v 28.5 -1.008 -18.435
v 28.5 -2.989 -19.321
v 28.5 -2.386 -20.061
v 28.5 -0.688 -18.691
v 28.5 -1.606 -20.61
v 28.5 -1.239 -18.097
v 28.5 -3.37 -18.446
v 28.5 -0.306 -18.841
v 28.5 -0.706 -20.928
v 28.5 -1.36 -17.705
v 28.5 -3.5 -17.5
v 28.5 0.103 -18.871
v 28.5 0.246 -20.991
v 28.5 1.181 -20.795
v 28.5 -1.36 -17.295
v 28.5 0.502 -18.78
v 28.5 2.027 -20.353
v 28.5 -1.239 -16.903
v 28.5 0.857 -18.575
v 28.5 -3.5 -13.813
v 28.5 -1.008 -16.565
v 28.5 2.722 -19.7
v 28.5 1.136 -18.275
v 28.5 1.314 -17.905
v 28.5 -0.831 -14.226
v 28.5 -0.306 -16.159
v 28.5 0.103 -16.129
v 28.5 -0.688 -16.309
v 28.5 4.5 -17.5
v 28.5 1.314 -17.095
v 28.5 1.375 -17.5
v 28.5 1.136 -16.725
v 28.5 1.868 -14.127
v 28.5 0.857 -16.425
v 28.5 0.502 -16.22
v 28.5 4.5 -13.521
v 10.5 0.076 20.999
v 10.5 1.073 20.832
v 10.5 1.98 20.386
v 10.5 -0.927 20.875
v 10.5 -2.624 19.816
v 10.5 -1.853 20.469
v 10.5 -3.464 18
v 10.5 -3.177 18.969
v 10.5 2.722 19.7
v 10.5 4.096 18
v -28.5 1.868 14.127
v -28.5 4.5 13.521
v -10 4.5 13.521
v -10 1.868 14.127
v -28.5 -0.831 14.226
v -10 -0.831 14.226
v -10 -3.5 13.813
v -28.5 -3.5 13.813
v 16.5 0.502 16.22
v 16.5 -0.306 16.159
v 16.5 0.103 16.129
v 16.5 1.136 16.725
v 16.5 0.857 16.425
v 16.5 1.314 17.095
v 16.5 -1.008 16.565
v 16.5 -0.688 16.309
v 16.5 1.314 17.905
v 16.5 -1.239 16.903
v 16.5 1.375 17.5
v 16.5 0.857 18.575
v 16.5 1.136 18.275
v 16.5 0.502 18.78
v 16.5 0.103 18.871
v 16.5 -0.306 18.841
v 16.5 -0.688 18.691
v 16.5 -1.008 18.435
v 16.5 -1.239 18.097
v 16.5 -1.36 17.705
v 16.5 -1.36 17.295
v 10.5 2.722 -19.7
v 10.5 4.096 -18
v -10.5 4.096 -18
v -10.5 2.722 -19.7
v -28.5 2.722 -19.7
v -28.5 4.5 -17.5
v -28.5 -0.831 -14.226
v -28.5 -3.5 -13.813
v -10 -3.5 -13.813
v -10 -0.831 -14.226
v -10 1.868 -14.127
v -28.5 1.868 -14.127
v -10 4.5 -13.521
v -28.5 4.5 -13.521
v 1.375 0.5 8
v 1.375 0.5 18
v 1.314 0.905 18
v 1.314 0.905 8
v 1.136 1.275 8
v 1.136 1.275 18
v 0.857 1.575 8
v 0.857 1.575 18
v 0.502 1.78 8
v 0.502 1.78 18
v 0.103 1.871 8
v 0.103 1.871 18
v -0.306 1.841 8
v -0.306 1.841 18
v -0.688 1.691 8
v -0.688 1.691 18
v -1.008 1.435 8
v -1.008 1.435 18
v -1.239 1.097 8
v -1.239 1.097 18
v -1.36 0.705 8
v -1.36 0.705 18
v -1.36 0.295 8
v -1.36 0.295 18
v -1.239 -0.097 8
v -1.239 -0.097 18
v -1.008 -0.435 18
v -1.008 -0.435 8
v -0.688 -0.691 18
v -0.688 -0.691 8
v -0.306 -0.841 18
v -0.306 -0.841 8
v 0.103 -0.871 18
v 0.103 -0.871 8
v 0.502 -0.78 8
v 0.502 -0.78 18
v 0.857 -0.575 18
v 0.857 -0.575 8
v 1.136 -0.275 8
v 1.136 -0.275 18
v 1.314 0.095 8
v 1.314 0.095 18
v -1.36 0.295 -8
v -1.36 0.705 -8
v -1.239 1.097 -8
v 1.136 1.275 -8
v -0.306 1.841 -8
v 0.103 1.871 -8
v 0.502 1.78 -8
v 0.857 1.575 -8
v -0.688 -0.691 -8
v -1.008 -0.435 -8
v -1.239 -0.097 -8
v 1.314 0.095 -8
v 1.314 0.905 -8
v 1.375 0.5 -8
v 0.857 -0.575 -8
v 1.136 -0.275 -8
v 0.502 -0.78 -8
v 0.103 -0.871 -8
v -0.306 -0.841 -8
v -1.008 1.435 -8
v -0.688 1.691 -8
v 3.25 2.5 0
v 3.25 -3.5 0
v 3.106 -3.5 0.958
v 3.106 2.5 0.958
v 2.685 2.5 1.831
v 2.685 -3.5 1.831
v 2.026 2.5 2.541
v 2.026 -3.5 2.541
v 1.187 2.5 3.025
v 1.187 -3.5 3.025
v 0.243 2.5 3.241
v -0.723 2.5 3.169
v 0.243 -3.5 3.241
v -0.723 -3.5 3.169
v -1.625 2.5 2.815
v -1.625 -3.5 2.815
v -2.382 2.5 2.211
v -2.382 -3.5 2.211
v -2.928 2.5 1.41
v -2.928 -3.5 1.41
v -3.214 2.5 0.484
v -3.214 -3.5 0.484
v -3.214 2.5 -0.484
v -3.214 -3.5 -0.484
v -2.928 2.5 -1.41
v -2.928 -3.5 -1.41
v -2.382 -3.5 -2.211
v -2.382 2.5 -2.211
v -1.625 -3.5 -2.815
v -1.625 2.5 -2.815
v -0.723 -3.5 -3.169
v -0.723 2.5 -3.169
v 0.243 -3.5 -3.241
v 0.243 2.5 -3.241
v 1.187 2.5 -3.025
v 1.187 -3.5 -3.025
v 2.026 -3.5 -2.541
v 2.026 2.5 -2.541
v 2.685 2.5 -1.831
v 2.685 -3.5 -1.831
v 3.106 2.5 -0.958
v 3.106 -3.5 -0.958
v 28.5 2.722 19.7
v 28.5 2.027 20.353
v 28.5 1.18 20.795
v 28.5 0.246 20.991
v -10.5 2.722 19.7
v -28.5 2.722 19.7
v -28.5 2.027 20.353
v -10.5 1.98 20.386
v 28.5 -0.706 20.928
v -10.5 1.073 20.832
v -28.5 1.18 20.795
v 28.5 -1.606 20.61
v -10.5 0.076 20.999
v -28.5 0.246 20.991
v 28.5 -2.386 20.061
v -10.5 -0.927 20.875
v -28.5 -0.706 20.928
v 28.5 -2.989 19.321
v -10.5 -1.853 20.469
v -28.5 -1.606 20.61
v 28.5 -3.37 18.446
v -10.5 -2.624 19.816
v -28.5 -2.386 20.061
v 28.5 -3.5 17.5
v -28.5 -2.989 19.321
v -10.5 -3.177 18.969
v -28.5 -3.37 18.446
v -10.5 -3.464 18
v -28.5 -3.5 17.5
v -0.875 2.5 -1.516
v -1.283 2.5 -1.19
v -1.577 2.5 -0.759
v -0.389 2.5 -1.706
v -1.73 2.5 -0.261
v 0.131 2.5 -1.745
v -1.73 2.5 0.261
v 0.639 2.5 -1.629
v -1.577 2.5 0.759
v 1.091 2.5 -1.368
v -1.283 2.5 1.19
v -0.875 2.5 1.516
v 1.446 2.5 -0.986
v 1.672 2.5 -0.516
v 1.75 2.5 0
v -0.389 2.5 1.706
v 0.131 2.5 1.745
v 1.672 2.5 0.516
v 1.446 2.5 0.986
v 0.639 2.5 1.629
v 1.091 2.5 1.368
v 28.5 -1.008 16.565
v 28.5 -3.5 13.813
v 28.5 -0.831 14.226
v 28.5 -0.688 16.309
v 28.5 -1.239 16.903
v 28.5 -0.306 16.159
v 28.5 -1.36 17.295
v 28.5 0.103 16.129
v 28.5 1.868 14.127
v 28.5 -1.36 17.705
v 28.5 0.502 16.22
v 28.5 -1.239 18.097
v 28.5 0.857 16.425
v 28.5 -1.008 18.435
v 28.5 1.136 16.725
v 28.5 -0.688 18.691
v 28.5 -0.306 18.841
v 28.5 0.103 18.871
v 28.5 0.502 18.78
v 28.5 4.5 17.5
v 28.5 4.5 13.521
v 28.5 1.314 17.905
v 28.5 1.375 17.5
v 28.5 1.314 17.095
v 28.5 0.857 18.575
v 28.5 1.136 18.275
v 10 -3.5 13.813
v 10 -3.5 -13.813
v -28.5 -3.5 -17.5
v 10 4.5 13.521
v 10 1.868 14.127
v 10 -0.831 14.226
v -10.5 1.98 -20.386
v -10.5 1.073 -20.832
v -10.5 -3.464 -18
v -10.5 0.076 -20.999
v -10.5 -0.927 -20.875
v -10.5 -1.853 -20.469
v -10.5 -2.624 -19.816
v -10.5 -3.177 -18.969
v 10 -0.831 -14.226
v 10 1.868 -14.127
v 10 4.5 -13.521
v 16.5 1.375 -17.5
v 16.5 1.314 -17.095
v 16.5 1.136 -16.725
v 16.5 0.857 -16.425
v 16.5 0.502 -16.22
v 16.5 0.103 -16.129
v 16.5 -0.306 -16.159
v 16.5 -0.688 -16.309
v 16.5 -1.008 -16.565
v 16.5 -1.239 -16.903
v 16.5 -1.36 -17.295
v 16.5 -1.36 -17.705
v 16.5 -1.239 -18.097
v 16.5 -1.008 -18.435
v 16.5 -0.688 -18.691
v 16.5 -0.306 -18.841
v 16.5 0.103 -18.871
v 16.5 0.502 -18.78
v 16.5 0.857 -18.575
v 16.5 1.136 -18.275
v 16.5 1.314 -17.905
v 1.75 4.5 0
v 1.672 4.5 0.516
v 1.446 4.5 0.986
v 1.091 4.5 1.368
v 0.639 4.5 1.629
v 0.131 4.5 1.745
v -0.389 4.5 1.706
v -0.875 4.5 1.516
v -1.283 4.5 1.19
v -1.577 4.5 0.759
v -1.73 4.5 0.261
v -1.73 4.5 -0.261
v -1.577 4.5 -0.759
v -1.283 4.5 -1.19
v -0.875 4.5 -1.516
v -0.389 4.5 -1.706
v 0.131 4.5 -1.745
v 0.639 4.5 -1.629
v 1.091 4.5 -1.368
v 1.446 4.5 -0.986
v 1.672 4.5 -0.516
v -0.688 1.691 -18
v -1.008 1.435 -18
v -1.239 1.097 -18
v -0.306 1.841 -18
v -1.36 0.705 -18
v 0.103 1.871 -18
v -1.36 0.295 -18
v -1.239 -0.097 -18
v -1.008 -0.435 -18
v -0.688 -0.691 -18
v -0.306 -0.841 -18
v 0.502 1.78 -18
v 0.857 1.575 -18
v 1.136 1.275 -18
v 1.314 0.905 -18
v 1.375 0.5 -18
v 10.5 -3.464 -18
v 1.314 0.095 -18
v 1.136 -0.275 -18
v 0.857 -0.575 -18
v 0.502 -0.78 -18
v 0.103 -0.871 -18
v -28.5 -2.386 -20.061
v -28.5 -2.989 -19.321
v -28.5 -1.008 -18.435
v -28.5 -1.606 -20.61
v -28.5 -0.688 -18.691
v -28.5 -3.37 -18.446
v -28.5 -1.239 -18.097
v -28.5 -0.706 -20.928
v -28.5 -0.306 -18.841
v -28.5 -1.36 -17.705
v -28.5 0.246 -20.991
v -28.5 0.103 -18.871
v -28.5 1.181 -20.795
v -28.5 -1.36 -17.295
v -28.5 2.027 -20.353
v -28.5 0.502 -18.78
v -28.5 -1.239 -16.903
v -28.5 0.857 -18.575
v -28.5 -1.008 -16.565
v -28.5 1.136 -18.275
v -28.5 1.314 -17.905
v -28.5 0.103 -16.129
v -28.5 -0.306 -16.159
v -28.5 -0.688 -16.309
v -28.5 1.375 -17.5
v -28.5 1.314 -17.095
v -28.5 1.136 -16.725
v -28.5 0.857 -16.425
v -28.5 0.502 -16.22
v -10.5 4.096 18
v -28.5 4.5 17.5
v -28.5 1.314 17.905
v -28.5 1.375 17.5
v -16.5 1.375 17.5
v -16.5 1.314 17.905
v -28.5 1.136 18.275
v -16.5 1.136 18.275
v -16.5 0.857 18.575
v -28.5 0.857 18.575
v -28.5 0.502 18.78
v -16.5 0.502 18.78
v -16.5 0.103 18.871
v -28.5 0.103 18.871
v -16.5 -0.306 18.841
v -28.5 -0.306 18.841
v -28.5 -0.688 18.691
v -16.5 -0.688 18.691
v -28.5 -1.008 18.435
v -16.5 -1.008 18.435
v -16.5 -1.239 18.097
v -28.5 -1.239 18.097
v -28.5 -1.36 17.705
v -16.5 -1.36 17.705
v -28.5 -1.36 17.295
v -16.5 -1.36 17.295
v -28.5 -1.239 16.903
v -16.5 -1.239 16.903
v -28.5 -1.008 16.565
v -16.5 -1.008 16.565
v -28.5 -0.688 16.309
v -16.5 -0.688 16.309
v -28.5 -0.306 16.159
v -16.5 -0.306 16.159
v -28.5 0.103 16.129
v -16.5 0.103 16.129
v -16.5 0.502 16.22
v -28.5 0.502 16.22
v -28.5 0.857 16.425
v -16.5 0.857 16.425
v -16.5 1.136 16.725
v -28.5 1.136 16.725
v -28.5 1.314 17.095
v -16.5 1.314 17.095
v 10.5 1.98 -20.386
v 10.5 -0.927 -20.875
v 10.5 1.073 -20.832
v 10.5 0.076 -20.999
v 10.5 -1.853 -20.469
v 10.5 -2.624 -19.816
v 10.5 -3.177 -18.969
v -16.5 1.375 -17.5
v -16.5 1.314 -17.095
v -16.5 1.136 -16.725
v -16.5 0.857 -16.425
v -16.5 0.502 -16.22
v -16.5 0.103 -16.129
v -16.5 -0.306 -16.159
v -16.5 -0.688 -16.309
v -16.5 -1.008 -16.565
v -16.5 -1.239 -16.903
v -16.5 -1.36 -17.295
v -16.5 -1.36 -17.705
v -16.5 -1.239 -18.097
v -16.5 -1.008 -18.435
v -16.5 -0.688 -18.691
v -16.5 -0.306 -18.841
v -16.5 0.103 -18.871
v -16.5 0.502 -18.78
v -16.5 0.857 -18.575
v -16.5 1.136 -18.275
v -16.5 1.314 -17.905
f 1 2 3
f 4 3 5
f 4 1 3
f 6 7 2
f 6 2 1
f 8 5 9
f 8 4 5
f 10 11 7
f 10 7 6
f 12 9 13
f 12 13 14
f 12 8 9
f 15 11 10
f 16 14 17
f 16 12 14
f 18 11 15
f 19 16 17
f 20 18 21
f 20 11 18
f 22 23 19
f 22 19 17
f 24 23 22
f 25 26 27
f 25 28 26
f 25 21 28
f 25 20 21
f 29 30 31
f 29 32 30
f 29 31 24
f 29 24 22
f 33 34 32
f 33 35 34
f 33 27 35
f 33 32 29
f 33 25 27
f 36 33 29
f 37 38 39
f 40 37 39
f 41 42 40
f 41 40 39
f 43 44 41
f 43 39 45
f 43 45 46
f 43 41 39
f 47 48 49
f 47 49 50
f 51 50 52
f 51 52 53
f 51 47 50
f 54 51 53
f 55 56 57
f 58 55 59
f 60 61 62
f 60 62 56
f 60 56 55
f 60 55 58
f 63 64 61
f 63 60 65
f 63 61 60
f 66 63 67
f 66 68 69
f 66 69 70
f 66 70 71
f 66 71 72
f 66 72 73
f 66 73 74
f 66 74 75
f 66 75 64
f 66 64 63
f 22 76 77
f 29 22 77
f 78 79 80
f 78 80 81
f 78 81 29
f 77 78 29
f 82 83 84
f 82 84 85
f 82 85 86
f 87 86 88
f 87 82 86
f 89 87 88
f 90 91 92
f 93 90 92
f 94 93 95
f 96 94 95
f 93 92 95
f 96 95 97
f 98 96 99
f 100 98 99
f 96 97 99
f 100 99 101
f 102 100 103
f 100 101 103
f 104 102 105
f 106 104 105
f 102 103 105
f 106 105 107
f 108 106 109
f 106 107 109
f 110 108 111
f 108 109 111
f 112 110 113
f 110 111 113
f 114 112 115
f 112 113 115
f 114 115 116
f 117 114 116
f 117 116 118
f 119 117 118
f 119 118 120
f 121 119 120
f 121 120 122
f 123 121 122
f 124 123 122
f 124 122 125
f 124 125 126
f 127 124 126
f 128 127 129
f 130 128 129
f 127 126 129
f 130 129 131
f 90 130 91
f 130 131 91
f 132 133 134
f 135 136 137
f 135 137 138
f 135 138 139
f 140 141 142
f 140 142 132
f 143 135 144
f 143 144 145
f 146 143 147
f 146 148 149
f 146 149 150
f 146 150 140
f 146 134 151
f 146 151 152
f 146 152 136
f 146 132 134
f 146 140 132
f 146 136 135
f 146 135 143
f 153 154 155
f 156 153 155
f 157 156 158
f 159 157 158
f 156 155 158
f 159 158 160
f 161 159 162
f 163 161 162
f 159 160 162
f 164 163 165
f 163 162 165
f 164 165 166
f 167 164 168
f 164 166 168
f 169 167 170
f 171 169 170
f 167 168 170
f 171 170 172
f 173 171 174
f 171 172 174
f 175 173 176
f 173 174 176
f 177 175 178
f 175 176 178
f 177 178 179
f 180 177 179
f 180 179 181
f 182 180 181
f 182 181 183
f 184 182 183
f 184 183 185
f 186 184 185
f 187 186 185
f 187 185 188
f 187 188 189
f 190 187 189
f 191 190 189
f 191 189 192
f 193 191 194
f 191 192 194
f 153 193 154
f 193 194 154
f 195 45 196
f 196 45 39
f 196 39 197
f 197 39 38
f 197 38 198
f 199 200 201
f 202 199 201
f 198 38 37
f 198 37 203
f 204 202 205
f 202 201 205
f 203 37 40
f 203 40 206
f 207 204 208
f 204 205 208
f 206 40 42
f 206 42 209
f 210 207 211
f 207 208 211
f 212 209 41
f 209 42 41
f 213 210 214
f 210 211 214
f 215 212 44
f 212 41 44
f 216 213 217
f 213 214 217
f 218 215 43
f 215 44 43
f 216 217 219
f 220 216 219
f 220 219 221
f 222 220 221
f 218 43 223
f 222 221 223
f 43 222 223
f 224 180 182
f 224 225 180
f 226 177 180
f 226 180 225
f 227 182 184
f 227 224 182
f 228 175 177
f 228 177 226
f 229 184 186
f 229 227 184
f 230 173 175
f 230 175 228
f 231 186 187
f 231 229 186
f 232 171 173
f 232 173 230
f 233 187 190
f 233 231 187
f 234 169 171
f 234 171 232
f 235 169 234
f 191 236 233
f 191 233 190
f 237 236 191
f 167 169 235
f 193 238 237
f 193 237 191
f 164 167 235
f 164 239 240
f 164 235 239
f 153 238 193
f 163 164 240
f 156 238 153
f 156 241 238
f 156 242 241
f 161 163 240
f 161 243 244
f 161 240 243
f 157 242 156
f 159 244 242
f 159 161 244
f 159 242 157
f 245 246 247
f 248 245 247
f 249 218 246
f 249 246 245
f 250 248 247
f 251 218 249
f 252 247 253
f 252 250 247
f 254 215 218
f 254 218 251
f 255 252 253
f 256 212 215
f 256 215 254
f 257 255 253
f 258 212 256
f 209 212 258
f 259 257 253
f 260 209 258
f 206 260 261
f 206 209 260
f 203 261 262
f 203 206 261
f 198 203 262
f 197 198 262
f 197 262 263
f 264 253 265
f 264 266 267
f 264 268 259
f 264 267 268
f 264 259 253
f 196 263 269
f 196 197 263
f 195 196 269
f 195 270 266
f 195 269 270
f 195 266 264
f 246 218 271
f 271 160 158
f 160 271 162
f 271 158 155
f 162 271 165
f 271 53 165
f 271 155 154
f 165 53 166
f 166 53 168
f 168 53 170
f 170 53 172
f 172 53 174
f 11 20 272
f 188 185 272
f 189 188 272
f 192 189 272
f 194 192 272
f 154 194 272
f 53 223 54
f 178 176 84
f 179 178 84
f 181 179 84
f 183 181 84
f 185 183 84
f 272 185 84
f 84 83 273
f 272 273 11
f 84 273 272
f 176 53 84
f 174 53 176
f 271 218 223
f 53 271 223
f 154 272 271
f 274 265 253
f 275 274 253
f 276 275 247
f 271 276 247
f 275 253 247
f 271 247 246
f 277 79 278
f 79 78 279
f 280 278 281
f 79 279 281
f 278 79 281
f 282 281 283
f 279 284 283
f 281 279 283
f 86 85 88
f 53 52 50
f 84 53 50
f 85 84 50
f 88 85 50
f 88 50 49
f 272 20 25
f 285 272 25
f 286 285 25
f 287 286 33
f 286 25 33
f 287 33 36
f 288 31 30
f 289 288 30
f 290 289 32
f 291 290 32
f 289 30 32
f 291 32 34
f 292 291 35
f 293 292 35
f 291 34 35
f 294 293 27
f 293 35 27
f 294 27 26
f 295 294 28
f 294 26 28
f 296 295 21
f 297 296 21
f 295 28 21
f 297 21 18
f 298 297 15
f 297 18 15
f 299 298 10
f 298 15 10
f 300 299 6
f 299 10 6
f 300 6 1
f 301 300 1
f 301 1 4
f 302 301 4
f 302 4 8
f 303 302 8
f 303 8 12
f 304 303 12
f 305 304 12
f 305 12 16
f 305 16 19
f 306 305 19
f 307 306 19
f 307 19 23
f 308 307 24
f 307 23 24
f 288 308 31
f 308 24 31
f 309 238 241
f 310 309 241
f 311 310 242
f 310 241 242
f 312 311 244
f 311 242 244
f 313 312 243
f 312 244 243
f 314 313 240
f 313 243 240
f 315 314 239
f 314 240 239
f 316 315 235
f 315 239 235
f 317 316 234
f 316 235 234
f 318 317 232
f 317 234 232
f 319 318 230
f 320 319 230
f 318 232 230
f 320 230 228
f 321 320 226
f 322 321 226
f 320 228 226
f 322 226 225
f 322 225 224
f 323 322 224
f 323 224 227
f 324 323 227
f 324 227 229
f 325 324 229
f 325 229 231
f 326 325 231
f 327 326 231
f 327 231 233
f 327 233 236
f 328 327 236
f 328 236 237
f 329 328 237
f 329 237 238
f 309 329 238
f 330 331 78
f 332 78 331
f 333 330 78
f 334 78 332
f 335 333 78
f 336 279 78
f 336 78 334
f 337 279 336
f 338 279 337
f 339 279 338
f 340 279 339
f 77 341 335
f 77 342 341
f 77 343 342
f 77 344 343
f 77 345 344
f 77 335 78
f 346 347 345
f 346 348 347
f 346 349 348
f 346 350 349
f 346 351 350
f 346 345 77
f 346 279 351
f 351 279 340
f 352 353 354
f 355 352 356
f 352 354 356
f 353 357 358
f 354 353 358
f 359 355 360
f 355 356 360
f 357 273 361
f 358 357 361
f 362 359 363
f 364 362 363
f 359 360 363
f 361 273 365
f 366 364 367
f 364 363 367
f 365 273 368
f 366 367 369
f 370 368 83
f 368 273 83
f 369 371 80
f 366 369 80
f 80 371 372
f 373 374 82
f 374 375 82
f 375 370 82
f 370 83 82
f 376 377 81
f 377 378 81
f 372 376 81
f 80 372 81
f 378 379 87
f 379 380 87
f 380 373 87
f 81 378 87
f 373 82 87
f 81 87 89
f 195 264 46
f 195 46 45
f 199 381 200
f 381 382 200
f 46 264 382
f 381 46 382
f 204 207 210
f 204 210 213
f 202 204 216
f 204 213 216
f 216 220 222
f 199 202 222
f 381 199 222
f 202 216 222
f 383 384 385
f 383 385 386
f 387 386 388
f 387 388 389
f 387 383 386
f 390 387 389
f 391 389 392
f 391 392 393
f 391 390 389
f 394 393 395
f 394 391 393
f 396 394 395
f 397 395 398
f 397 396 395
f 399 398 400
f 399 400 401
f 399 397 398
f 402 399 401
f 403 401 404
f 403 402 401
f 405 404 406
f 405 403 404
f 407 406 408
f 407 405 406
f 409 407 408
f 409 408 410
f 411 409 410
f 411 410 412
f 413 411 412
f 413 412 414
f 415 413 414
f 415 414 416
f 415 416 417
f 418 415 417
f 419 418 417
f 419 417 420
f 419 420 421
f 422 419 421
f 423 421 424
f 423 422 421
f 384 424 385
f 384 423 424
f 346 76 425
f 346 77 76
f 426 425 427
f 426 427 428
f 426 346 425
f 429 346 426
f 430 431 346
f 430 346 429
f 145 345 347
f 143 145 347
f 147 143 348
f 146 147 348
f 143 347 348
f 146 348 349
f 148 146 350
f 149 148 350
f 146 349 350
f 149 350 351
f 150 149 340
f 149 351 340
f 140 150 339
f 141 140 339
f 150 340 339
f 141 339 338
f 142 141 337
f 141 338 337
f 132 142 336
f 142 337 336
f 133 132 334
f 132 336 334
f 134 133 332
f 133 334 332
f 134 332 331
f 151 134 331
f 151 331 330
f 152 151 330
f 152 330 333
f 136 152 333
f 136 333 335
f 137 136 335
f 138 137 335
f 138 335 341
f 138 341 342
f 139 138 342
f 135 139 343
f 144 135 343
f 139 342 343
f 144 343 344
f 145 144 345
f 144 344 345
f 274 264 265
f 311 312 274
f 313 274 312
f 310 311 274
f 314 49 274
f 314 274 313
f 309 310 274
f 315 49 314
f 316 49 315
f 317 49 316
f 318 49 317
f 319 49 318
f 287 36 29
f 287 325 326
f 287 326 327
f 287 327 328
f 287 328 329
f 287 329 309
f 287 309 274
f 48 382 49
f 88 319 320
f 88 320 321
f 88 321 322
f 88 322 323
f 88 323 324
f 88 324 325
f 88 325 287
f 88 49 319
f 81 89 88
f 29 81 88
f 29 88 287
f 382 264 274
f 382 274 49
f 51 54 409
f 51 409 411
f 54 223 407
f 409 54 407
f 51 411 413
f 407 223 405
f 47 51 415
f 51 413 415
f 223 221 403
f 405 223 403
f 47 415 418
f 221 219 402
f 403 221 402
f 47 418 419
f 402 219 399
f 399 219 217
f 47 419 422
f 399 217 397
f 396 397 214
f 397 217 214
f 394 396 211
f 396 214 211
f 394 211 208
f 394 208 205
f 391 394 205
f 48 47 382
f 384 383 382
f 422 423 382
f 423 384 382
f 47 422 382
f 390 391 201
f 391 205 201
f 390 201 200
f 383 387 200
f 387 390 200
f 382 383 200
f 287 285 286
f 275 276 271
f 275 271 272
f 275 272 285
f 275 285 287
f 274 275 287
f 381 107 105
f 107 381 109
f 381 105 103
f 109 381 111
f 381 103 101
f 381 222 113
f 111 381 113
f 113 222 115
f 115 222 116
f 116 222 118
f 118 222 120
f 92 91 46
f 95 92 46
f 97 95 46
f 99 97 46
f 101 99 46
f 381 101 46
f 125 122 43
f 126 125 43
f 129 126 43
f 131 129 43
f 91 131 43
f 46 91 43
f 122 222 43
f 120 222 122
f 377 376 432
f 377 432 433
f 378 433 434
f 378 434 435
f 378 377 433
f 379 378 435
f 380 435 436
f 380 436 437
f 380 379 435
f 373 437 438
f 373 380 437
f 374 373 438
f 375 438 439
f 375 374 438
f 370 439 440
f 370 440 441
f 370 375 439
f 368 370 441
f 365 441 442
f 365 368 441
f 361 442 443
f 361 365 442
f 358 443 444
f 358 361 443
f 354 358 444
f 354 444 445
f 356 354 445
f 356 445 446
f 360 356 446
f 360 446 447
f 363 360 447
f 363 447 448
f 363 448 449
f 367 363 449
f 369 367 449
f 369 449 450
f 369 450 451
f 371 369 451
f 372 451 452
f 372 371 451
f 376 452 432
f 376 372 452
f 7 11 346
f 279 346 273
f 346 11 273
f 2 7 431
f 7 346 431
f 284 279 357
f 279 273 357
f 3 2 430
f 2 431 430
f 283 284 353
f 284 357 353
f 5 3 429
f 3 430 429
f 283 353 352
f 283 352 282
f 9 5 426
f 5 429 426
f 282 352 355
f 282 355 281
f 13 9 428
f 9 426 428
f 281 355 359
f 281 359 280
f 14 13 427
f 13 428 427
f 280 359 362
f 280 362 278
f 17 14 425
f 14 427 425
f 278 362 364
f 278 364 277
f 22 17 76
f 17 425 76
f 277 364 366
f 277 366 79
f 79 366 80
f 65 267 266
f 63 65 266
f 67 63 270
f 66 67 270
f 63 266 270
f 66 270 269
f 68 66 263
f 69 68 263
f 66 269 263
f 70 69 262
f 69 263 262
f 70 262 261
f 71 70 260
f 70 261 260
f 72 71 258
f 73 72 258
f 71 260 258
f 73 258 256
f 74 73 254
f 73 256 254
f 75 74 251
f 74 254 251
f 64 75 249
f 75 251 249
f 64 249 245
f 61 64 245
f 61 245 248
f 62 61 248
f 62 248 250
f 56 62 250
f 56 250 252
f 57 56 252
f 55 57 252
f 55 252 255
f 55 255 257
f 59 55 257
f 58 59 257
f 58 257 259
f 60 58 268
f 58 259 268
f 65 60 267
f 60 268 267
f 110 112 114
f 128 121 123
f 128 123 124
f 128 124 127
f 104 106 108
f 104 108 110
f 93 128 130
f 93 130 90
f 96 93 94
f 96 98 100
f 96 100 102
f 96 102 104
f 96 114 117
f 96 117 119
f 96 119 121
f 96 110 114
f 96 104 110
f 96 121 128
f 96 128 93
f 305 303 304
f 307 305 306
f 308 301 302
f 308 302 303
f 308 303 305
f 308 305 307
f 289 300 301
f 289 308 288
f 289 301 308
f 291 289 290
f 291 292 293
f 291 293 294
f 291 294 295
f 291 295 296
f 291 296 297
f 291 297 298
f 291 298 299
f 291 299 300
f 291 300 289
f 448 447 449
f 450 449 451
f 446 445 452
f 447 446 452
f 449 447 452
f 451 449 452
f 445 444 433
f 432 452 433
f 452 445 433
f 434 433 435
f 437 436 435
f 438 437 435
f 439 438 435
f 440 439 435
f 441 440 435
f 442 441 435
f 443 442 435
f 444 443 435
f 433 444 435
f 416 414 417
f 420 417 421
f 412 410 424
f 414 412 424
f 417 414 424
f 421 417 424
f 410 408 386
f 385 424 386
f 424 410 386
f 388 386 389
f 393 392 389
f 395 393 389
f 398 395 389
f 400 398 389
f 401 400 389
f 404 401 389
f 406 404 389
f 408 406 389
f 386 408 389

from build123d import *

# Parameters (mm, degrees)
PAD_DEPTH       = 28.5
SKETCH001_R     = 14.25
POCKET_DEPTH    = 18.5
SKETCH002_R     = 1.375
POCKET001_DEPTH = 12
SKETCH003_W     = 4
SKETCH003_H     = 10.5
POCKET002_DEPTH = 8
SKETCH004_R     = 1.75
POCKET003_DEPTH = 8
SKETCH005_R     = 3.25
POCKET004_DEPTH = 6
SKETCH006_R     = 1.375
POCKET005_DEPTH = 10
SKETCH007_R     = 1.375
POCKET006_DEPTH = 10


with BuildPart() as recess_pocket:
    # Sketch → Pad (new body)
    with BuildSketch(Plane.YZ):
        with BuildLine():
            ThreePointArc((2.722222, 19.699888), (-1.166667, 20.799832), (-3.5, 17.5))
            Line((-3.5, 17.5), (-3.5, -17.5))
            ThreePointArc((-3.5, -17.5), (-1.166657, -20.799835), (2.722235, -19.699872))
            Line((2.722235, -19.699872), (4.5, -17.5))
            Line((4.5, 17.5), (4.5, -17.5))
            Line((4.5, 17.5), (2.722222, 19.699888))
        make_face()
    extrude(amount=PAD_DEPTH)

    # Sketch001 → Pocket (cut)
    with BuildSketch(Plane.YZ.offset(28.5)):
        Circle(SKETCH001_R)
    extrude(amount=-POCKET_DEPTH, mode=Mode.SUBTRACT)

    # Sketch002 → Pocket001 (cut)
    with BuildSketch(Plane.YZ.offset(28.5)):
        with Locations((0, -17.5)):
            Circle(SKETCH002_R)
        with Locations((0, 17.5)):
            Circle(SKETCH002_R)
    extrude(amount=-POCKET001_DEPTH, mode=Mode.SUBTRACT)

    # Sketch003 → Pocket002 (cut)
    with BuildSketch(Plane(origin=(0, -3.5, 0), x_dir=(0, 0, -1), z_dir=(0, -1, 0))):
        with Locations((-20, 5.25)):
            Rectangle(SKETCH003_W, SKETCH003_H)
        with Locations((20, 5.25)):
            Rectangle(SKETCH003_W, SKETCH003_H)
    extrude(amount=-POCKET002_DEPTH, mode=Mode.SUBTRACT)


with BuildPart() as bottom_screw_hole_pocket:
    # Part__Mirroring: instance of recess-pocket
    add(recess_pocket.part.mirror(Plane(origin=(0, 0, 0), x_dir=(0, -1, 0), z_dir=(1, 0, 0))))

    # Fusion: union recess-pocket
    add(recess_pocket.part)

    # Sketch004 → Pocket003 (cut)
    with BuildSketch(Plane.XZ.offset(3.5)):
        Circle(SKETCH004_R)
    extrude(amount=-POCKET003_DEPTH, mode=Mode.SUBTRACT)

    # Sketch005 → Pocket004 (cut)
    with BuildSketch(Plane.XZ.offset(3.5)):
        Circle(SKETCH005_R)
    extrude(amount=-POCKET004_DEPTH, mode=Mode.SUBTRACT)

    # Sketch006 → Pocket005 (cut)
    with BuildSketch(Plane.XY.offset(18)):
        with Locations((0, 0.5)):
            Circle(SKETCH006_R)
    extrude(amount=-POCKET005_DEPTH, mode=Mode.SUBTRACT)

    # Sketch007 → Pocket006 (cut)
    with BuildSketch(Plane(origin=(0, 0, -18), x_dir=(1, 0, 0), z_dir=(0, 0, -1))):
        with Locations((0, -0.5)):
            Circle(SKETCH007_R)
    extrude(amount=-POCKET006_DEPTH, mode=Mode.SUBTRACT)


solid = bottom_screw_hole_pocket.part
